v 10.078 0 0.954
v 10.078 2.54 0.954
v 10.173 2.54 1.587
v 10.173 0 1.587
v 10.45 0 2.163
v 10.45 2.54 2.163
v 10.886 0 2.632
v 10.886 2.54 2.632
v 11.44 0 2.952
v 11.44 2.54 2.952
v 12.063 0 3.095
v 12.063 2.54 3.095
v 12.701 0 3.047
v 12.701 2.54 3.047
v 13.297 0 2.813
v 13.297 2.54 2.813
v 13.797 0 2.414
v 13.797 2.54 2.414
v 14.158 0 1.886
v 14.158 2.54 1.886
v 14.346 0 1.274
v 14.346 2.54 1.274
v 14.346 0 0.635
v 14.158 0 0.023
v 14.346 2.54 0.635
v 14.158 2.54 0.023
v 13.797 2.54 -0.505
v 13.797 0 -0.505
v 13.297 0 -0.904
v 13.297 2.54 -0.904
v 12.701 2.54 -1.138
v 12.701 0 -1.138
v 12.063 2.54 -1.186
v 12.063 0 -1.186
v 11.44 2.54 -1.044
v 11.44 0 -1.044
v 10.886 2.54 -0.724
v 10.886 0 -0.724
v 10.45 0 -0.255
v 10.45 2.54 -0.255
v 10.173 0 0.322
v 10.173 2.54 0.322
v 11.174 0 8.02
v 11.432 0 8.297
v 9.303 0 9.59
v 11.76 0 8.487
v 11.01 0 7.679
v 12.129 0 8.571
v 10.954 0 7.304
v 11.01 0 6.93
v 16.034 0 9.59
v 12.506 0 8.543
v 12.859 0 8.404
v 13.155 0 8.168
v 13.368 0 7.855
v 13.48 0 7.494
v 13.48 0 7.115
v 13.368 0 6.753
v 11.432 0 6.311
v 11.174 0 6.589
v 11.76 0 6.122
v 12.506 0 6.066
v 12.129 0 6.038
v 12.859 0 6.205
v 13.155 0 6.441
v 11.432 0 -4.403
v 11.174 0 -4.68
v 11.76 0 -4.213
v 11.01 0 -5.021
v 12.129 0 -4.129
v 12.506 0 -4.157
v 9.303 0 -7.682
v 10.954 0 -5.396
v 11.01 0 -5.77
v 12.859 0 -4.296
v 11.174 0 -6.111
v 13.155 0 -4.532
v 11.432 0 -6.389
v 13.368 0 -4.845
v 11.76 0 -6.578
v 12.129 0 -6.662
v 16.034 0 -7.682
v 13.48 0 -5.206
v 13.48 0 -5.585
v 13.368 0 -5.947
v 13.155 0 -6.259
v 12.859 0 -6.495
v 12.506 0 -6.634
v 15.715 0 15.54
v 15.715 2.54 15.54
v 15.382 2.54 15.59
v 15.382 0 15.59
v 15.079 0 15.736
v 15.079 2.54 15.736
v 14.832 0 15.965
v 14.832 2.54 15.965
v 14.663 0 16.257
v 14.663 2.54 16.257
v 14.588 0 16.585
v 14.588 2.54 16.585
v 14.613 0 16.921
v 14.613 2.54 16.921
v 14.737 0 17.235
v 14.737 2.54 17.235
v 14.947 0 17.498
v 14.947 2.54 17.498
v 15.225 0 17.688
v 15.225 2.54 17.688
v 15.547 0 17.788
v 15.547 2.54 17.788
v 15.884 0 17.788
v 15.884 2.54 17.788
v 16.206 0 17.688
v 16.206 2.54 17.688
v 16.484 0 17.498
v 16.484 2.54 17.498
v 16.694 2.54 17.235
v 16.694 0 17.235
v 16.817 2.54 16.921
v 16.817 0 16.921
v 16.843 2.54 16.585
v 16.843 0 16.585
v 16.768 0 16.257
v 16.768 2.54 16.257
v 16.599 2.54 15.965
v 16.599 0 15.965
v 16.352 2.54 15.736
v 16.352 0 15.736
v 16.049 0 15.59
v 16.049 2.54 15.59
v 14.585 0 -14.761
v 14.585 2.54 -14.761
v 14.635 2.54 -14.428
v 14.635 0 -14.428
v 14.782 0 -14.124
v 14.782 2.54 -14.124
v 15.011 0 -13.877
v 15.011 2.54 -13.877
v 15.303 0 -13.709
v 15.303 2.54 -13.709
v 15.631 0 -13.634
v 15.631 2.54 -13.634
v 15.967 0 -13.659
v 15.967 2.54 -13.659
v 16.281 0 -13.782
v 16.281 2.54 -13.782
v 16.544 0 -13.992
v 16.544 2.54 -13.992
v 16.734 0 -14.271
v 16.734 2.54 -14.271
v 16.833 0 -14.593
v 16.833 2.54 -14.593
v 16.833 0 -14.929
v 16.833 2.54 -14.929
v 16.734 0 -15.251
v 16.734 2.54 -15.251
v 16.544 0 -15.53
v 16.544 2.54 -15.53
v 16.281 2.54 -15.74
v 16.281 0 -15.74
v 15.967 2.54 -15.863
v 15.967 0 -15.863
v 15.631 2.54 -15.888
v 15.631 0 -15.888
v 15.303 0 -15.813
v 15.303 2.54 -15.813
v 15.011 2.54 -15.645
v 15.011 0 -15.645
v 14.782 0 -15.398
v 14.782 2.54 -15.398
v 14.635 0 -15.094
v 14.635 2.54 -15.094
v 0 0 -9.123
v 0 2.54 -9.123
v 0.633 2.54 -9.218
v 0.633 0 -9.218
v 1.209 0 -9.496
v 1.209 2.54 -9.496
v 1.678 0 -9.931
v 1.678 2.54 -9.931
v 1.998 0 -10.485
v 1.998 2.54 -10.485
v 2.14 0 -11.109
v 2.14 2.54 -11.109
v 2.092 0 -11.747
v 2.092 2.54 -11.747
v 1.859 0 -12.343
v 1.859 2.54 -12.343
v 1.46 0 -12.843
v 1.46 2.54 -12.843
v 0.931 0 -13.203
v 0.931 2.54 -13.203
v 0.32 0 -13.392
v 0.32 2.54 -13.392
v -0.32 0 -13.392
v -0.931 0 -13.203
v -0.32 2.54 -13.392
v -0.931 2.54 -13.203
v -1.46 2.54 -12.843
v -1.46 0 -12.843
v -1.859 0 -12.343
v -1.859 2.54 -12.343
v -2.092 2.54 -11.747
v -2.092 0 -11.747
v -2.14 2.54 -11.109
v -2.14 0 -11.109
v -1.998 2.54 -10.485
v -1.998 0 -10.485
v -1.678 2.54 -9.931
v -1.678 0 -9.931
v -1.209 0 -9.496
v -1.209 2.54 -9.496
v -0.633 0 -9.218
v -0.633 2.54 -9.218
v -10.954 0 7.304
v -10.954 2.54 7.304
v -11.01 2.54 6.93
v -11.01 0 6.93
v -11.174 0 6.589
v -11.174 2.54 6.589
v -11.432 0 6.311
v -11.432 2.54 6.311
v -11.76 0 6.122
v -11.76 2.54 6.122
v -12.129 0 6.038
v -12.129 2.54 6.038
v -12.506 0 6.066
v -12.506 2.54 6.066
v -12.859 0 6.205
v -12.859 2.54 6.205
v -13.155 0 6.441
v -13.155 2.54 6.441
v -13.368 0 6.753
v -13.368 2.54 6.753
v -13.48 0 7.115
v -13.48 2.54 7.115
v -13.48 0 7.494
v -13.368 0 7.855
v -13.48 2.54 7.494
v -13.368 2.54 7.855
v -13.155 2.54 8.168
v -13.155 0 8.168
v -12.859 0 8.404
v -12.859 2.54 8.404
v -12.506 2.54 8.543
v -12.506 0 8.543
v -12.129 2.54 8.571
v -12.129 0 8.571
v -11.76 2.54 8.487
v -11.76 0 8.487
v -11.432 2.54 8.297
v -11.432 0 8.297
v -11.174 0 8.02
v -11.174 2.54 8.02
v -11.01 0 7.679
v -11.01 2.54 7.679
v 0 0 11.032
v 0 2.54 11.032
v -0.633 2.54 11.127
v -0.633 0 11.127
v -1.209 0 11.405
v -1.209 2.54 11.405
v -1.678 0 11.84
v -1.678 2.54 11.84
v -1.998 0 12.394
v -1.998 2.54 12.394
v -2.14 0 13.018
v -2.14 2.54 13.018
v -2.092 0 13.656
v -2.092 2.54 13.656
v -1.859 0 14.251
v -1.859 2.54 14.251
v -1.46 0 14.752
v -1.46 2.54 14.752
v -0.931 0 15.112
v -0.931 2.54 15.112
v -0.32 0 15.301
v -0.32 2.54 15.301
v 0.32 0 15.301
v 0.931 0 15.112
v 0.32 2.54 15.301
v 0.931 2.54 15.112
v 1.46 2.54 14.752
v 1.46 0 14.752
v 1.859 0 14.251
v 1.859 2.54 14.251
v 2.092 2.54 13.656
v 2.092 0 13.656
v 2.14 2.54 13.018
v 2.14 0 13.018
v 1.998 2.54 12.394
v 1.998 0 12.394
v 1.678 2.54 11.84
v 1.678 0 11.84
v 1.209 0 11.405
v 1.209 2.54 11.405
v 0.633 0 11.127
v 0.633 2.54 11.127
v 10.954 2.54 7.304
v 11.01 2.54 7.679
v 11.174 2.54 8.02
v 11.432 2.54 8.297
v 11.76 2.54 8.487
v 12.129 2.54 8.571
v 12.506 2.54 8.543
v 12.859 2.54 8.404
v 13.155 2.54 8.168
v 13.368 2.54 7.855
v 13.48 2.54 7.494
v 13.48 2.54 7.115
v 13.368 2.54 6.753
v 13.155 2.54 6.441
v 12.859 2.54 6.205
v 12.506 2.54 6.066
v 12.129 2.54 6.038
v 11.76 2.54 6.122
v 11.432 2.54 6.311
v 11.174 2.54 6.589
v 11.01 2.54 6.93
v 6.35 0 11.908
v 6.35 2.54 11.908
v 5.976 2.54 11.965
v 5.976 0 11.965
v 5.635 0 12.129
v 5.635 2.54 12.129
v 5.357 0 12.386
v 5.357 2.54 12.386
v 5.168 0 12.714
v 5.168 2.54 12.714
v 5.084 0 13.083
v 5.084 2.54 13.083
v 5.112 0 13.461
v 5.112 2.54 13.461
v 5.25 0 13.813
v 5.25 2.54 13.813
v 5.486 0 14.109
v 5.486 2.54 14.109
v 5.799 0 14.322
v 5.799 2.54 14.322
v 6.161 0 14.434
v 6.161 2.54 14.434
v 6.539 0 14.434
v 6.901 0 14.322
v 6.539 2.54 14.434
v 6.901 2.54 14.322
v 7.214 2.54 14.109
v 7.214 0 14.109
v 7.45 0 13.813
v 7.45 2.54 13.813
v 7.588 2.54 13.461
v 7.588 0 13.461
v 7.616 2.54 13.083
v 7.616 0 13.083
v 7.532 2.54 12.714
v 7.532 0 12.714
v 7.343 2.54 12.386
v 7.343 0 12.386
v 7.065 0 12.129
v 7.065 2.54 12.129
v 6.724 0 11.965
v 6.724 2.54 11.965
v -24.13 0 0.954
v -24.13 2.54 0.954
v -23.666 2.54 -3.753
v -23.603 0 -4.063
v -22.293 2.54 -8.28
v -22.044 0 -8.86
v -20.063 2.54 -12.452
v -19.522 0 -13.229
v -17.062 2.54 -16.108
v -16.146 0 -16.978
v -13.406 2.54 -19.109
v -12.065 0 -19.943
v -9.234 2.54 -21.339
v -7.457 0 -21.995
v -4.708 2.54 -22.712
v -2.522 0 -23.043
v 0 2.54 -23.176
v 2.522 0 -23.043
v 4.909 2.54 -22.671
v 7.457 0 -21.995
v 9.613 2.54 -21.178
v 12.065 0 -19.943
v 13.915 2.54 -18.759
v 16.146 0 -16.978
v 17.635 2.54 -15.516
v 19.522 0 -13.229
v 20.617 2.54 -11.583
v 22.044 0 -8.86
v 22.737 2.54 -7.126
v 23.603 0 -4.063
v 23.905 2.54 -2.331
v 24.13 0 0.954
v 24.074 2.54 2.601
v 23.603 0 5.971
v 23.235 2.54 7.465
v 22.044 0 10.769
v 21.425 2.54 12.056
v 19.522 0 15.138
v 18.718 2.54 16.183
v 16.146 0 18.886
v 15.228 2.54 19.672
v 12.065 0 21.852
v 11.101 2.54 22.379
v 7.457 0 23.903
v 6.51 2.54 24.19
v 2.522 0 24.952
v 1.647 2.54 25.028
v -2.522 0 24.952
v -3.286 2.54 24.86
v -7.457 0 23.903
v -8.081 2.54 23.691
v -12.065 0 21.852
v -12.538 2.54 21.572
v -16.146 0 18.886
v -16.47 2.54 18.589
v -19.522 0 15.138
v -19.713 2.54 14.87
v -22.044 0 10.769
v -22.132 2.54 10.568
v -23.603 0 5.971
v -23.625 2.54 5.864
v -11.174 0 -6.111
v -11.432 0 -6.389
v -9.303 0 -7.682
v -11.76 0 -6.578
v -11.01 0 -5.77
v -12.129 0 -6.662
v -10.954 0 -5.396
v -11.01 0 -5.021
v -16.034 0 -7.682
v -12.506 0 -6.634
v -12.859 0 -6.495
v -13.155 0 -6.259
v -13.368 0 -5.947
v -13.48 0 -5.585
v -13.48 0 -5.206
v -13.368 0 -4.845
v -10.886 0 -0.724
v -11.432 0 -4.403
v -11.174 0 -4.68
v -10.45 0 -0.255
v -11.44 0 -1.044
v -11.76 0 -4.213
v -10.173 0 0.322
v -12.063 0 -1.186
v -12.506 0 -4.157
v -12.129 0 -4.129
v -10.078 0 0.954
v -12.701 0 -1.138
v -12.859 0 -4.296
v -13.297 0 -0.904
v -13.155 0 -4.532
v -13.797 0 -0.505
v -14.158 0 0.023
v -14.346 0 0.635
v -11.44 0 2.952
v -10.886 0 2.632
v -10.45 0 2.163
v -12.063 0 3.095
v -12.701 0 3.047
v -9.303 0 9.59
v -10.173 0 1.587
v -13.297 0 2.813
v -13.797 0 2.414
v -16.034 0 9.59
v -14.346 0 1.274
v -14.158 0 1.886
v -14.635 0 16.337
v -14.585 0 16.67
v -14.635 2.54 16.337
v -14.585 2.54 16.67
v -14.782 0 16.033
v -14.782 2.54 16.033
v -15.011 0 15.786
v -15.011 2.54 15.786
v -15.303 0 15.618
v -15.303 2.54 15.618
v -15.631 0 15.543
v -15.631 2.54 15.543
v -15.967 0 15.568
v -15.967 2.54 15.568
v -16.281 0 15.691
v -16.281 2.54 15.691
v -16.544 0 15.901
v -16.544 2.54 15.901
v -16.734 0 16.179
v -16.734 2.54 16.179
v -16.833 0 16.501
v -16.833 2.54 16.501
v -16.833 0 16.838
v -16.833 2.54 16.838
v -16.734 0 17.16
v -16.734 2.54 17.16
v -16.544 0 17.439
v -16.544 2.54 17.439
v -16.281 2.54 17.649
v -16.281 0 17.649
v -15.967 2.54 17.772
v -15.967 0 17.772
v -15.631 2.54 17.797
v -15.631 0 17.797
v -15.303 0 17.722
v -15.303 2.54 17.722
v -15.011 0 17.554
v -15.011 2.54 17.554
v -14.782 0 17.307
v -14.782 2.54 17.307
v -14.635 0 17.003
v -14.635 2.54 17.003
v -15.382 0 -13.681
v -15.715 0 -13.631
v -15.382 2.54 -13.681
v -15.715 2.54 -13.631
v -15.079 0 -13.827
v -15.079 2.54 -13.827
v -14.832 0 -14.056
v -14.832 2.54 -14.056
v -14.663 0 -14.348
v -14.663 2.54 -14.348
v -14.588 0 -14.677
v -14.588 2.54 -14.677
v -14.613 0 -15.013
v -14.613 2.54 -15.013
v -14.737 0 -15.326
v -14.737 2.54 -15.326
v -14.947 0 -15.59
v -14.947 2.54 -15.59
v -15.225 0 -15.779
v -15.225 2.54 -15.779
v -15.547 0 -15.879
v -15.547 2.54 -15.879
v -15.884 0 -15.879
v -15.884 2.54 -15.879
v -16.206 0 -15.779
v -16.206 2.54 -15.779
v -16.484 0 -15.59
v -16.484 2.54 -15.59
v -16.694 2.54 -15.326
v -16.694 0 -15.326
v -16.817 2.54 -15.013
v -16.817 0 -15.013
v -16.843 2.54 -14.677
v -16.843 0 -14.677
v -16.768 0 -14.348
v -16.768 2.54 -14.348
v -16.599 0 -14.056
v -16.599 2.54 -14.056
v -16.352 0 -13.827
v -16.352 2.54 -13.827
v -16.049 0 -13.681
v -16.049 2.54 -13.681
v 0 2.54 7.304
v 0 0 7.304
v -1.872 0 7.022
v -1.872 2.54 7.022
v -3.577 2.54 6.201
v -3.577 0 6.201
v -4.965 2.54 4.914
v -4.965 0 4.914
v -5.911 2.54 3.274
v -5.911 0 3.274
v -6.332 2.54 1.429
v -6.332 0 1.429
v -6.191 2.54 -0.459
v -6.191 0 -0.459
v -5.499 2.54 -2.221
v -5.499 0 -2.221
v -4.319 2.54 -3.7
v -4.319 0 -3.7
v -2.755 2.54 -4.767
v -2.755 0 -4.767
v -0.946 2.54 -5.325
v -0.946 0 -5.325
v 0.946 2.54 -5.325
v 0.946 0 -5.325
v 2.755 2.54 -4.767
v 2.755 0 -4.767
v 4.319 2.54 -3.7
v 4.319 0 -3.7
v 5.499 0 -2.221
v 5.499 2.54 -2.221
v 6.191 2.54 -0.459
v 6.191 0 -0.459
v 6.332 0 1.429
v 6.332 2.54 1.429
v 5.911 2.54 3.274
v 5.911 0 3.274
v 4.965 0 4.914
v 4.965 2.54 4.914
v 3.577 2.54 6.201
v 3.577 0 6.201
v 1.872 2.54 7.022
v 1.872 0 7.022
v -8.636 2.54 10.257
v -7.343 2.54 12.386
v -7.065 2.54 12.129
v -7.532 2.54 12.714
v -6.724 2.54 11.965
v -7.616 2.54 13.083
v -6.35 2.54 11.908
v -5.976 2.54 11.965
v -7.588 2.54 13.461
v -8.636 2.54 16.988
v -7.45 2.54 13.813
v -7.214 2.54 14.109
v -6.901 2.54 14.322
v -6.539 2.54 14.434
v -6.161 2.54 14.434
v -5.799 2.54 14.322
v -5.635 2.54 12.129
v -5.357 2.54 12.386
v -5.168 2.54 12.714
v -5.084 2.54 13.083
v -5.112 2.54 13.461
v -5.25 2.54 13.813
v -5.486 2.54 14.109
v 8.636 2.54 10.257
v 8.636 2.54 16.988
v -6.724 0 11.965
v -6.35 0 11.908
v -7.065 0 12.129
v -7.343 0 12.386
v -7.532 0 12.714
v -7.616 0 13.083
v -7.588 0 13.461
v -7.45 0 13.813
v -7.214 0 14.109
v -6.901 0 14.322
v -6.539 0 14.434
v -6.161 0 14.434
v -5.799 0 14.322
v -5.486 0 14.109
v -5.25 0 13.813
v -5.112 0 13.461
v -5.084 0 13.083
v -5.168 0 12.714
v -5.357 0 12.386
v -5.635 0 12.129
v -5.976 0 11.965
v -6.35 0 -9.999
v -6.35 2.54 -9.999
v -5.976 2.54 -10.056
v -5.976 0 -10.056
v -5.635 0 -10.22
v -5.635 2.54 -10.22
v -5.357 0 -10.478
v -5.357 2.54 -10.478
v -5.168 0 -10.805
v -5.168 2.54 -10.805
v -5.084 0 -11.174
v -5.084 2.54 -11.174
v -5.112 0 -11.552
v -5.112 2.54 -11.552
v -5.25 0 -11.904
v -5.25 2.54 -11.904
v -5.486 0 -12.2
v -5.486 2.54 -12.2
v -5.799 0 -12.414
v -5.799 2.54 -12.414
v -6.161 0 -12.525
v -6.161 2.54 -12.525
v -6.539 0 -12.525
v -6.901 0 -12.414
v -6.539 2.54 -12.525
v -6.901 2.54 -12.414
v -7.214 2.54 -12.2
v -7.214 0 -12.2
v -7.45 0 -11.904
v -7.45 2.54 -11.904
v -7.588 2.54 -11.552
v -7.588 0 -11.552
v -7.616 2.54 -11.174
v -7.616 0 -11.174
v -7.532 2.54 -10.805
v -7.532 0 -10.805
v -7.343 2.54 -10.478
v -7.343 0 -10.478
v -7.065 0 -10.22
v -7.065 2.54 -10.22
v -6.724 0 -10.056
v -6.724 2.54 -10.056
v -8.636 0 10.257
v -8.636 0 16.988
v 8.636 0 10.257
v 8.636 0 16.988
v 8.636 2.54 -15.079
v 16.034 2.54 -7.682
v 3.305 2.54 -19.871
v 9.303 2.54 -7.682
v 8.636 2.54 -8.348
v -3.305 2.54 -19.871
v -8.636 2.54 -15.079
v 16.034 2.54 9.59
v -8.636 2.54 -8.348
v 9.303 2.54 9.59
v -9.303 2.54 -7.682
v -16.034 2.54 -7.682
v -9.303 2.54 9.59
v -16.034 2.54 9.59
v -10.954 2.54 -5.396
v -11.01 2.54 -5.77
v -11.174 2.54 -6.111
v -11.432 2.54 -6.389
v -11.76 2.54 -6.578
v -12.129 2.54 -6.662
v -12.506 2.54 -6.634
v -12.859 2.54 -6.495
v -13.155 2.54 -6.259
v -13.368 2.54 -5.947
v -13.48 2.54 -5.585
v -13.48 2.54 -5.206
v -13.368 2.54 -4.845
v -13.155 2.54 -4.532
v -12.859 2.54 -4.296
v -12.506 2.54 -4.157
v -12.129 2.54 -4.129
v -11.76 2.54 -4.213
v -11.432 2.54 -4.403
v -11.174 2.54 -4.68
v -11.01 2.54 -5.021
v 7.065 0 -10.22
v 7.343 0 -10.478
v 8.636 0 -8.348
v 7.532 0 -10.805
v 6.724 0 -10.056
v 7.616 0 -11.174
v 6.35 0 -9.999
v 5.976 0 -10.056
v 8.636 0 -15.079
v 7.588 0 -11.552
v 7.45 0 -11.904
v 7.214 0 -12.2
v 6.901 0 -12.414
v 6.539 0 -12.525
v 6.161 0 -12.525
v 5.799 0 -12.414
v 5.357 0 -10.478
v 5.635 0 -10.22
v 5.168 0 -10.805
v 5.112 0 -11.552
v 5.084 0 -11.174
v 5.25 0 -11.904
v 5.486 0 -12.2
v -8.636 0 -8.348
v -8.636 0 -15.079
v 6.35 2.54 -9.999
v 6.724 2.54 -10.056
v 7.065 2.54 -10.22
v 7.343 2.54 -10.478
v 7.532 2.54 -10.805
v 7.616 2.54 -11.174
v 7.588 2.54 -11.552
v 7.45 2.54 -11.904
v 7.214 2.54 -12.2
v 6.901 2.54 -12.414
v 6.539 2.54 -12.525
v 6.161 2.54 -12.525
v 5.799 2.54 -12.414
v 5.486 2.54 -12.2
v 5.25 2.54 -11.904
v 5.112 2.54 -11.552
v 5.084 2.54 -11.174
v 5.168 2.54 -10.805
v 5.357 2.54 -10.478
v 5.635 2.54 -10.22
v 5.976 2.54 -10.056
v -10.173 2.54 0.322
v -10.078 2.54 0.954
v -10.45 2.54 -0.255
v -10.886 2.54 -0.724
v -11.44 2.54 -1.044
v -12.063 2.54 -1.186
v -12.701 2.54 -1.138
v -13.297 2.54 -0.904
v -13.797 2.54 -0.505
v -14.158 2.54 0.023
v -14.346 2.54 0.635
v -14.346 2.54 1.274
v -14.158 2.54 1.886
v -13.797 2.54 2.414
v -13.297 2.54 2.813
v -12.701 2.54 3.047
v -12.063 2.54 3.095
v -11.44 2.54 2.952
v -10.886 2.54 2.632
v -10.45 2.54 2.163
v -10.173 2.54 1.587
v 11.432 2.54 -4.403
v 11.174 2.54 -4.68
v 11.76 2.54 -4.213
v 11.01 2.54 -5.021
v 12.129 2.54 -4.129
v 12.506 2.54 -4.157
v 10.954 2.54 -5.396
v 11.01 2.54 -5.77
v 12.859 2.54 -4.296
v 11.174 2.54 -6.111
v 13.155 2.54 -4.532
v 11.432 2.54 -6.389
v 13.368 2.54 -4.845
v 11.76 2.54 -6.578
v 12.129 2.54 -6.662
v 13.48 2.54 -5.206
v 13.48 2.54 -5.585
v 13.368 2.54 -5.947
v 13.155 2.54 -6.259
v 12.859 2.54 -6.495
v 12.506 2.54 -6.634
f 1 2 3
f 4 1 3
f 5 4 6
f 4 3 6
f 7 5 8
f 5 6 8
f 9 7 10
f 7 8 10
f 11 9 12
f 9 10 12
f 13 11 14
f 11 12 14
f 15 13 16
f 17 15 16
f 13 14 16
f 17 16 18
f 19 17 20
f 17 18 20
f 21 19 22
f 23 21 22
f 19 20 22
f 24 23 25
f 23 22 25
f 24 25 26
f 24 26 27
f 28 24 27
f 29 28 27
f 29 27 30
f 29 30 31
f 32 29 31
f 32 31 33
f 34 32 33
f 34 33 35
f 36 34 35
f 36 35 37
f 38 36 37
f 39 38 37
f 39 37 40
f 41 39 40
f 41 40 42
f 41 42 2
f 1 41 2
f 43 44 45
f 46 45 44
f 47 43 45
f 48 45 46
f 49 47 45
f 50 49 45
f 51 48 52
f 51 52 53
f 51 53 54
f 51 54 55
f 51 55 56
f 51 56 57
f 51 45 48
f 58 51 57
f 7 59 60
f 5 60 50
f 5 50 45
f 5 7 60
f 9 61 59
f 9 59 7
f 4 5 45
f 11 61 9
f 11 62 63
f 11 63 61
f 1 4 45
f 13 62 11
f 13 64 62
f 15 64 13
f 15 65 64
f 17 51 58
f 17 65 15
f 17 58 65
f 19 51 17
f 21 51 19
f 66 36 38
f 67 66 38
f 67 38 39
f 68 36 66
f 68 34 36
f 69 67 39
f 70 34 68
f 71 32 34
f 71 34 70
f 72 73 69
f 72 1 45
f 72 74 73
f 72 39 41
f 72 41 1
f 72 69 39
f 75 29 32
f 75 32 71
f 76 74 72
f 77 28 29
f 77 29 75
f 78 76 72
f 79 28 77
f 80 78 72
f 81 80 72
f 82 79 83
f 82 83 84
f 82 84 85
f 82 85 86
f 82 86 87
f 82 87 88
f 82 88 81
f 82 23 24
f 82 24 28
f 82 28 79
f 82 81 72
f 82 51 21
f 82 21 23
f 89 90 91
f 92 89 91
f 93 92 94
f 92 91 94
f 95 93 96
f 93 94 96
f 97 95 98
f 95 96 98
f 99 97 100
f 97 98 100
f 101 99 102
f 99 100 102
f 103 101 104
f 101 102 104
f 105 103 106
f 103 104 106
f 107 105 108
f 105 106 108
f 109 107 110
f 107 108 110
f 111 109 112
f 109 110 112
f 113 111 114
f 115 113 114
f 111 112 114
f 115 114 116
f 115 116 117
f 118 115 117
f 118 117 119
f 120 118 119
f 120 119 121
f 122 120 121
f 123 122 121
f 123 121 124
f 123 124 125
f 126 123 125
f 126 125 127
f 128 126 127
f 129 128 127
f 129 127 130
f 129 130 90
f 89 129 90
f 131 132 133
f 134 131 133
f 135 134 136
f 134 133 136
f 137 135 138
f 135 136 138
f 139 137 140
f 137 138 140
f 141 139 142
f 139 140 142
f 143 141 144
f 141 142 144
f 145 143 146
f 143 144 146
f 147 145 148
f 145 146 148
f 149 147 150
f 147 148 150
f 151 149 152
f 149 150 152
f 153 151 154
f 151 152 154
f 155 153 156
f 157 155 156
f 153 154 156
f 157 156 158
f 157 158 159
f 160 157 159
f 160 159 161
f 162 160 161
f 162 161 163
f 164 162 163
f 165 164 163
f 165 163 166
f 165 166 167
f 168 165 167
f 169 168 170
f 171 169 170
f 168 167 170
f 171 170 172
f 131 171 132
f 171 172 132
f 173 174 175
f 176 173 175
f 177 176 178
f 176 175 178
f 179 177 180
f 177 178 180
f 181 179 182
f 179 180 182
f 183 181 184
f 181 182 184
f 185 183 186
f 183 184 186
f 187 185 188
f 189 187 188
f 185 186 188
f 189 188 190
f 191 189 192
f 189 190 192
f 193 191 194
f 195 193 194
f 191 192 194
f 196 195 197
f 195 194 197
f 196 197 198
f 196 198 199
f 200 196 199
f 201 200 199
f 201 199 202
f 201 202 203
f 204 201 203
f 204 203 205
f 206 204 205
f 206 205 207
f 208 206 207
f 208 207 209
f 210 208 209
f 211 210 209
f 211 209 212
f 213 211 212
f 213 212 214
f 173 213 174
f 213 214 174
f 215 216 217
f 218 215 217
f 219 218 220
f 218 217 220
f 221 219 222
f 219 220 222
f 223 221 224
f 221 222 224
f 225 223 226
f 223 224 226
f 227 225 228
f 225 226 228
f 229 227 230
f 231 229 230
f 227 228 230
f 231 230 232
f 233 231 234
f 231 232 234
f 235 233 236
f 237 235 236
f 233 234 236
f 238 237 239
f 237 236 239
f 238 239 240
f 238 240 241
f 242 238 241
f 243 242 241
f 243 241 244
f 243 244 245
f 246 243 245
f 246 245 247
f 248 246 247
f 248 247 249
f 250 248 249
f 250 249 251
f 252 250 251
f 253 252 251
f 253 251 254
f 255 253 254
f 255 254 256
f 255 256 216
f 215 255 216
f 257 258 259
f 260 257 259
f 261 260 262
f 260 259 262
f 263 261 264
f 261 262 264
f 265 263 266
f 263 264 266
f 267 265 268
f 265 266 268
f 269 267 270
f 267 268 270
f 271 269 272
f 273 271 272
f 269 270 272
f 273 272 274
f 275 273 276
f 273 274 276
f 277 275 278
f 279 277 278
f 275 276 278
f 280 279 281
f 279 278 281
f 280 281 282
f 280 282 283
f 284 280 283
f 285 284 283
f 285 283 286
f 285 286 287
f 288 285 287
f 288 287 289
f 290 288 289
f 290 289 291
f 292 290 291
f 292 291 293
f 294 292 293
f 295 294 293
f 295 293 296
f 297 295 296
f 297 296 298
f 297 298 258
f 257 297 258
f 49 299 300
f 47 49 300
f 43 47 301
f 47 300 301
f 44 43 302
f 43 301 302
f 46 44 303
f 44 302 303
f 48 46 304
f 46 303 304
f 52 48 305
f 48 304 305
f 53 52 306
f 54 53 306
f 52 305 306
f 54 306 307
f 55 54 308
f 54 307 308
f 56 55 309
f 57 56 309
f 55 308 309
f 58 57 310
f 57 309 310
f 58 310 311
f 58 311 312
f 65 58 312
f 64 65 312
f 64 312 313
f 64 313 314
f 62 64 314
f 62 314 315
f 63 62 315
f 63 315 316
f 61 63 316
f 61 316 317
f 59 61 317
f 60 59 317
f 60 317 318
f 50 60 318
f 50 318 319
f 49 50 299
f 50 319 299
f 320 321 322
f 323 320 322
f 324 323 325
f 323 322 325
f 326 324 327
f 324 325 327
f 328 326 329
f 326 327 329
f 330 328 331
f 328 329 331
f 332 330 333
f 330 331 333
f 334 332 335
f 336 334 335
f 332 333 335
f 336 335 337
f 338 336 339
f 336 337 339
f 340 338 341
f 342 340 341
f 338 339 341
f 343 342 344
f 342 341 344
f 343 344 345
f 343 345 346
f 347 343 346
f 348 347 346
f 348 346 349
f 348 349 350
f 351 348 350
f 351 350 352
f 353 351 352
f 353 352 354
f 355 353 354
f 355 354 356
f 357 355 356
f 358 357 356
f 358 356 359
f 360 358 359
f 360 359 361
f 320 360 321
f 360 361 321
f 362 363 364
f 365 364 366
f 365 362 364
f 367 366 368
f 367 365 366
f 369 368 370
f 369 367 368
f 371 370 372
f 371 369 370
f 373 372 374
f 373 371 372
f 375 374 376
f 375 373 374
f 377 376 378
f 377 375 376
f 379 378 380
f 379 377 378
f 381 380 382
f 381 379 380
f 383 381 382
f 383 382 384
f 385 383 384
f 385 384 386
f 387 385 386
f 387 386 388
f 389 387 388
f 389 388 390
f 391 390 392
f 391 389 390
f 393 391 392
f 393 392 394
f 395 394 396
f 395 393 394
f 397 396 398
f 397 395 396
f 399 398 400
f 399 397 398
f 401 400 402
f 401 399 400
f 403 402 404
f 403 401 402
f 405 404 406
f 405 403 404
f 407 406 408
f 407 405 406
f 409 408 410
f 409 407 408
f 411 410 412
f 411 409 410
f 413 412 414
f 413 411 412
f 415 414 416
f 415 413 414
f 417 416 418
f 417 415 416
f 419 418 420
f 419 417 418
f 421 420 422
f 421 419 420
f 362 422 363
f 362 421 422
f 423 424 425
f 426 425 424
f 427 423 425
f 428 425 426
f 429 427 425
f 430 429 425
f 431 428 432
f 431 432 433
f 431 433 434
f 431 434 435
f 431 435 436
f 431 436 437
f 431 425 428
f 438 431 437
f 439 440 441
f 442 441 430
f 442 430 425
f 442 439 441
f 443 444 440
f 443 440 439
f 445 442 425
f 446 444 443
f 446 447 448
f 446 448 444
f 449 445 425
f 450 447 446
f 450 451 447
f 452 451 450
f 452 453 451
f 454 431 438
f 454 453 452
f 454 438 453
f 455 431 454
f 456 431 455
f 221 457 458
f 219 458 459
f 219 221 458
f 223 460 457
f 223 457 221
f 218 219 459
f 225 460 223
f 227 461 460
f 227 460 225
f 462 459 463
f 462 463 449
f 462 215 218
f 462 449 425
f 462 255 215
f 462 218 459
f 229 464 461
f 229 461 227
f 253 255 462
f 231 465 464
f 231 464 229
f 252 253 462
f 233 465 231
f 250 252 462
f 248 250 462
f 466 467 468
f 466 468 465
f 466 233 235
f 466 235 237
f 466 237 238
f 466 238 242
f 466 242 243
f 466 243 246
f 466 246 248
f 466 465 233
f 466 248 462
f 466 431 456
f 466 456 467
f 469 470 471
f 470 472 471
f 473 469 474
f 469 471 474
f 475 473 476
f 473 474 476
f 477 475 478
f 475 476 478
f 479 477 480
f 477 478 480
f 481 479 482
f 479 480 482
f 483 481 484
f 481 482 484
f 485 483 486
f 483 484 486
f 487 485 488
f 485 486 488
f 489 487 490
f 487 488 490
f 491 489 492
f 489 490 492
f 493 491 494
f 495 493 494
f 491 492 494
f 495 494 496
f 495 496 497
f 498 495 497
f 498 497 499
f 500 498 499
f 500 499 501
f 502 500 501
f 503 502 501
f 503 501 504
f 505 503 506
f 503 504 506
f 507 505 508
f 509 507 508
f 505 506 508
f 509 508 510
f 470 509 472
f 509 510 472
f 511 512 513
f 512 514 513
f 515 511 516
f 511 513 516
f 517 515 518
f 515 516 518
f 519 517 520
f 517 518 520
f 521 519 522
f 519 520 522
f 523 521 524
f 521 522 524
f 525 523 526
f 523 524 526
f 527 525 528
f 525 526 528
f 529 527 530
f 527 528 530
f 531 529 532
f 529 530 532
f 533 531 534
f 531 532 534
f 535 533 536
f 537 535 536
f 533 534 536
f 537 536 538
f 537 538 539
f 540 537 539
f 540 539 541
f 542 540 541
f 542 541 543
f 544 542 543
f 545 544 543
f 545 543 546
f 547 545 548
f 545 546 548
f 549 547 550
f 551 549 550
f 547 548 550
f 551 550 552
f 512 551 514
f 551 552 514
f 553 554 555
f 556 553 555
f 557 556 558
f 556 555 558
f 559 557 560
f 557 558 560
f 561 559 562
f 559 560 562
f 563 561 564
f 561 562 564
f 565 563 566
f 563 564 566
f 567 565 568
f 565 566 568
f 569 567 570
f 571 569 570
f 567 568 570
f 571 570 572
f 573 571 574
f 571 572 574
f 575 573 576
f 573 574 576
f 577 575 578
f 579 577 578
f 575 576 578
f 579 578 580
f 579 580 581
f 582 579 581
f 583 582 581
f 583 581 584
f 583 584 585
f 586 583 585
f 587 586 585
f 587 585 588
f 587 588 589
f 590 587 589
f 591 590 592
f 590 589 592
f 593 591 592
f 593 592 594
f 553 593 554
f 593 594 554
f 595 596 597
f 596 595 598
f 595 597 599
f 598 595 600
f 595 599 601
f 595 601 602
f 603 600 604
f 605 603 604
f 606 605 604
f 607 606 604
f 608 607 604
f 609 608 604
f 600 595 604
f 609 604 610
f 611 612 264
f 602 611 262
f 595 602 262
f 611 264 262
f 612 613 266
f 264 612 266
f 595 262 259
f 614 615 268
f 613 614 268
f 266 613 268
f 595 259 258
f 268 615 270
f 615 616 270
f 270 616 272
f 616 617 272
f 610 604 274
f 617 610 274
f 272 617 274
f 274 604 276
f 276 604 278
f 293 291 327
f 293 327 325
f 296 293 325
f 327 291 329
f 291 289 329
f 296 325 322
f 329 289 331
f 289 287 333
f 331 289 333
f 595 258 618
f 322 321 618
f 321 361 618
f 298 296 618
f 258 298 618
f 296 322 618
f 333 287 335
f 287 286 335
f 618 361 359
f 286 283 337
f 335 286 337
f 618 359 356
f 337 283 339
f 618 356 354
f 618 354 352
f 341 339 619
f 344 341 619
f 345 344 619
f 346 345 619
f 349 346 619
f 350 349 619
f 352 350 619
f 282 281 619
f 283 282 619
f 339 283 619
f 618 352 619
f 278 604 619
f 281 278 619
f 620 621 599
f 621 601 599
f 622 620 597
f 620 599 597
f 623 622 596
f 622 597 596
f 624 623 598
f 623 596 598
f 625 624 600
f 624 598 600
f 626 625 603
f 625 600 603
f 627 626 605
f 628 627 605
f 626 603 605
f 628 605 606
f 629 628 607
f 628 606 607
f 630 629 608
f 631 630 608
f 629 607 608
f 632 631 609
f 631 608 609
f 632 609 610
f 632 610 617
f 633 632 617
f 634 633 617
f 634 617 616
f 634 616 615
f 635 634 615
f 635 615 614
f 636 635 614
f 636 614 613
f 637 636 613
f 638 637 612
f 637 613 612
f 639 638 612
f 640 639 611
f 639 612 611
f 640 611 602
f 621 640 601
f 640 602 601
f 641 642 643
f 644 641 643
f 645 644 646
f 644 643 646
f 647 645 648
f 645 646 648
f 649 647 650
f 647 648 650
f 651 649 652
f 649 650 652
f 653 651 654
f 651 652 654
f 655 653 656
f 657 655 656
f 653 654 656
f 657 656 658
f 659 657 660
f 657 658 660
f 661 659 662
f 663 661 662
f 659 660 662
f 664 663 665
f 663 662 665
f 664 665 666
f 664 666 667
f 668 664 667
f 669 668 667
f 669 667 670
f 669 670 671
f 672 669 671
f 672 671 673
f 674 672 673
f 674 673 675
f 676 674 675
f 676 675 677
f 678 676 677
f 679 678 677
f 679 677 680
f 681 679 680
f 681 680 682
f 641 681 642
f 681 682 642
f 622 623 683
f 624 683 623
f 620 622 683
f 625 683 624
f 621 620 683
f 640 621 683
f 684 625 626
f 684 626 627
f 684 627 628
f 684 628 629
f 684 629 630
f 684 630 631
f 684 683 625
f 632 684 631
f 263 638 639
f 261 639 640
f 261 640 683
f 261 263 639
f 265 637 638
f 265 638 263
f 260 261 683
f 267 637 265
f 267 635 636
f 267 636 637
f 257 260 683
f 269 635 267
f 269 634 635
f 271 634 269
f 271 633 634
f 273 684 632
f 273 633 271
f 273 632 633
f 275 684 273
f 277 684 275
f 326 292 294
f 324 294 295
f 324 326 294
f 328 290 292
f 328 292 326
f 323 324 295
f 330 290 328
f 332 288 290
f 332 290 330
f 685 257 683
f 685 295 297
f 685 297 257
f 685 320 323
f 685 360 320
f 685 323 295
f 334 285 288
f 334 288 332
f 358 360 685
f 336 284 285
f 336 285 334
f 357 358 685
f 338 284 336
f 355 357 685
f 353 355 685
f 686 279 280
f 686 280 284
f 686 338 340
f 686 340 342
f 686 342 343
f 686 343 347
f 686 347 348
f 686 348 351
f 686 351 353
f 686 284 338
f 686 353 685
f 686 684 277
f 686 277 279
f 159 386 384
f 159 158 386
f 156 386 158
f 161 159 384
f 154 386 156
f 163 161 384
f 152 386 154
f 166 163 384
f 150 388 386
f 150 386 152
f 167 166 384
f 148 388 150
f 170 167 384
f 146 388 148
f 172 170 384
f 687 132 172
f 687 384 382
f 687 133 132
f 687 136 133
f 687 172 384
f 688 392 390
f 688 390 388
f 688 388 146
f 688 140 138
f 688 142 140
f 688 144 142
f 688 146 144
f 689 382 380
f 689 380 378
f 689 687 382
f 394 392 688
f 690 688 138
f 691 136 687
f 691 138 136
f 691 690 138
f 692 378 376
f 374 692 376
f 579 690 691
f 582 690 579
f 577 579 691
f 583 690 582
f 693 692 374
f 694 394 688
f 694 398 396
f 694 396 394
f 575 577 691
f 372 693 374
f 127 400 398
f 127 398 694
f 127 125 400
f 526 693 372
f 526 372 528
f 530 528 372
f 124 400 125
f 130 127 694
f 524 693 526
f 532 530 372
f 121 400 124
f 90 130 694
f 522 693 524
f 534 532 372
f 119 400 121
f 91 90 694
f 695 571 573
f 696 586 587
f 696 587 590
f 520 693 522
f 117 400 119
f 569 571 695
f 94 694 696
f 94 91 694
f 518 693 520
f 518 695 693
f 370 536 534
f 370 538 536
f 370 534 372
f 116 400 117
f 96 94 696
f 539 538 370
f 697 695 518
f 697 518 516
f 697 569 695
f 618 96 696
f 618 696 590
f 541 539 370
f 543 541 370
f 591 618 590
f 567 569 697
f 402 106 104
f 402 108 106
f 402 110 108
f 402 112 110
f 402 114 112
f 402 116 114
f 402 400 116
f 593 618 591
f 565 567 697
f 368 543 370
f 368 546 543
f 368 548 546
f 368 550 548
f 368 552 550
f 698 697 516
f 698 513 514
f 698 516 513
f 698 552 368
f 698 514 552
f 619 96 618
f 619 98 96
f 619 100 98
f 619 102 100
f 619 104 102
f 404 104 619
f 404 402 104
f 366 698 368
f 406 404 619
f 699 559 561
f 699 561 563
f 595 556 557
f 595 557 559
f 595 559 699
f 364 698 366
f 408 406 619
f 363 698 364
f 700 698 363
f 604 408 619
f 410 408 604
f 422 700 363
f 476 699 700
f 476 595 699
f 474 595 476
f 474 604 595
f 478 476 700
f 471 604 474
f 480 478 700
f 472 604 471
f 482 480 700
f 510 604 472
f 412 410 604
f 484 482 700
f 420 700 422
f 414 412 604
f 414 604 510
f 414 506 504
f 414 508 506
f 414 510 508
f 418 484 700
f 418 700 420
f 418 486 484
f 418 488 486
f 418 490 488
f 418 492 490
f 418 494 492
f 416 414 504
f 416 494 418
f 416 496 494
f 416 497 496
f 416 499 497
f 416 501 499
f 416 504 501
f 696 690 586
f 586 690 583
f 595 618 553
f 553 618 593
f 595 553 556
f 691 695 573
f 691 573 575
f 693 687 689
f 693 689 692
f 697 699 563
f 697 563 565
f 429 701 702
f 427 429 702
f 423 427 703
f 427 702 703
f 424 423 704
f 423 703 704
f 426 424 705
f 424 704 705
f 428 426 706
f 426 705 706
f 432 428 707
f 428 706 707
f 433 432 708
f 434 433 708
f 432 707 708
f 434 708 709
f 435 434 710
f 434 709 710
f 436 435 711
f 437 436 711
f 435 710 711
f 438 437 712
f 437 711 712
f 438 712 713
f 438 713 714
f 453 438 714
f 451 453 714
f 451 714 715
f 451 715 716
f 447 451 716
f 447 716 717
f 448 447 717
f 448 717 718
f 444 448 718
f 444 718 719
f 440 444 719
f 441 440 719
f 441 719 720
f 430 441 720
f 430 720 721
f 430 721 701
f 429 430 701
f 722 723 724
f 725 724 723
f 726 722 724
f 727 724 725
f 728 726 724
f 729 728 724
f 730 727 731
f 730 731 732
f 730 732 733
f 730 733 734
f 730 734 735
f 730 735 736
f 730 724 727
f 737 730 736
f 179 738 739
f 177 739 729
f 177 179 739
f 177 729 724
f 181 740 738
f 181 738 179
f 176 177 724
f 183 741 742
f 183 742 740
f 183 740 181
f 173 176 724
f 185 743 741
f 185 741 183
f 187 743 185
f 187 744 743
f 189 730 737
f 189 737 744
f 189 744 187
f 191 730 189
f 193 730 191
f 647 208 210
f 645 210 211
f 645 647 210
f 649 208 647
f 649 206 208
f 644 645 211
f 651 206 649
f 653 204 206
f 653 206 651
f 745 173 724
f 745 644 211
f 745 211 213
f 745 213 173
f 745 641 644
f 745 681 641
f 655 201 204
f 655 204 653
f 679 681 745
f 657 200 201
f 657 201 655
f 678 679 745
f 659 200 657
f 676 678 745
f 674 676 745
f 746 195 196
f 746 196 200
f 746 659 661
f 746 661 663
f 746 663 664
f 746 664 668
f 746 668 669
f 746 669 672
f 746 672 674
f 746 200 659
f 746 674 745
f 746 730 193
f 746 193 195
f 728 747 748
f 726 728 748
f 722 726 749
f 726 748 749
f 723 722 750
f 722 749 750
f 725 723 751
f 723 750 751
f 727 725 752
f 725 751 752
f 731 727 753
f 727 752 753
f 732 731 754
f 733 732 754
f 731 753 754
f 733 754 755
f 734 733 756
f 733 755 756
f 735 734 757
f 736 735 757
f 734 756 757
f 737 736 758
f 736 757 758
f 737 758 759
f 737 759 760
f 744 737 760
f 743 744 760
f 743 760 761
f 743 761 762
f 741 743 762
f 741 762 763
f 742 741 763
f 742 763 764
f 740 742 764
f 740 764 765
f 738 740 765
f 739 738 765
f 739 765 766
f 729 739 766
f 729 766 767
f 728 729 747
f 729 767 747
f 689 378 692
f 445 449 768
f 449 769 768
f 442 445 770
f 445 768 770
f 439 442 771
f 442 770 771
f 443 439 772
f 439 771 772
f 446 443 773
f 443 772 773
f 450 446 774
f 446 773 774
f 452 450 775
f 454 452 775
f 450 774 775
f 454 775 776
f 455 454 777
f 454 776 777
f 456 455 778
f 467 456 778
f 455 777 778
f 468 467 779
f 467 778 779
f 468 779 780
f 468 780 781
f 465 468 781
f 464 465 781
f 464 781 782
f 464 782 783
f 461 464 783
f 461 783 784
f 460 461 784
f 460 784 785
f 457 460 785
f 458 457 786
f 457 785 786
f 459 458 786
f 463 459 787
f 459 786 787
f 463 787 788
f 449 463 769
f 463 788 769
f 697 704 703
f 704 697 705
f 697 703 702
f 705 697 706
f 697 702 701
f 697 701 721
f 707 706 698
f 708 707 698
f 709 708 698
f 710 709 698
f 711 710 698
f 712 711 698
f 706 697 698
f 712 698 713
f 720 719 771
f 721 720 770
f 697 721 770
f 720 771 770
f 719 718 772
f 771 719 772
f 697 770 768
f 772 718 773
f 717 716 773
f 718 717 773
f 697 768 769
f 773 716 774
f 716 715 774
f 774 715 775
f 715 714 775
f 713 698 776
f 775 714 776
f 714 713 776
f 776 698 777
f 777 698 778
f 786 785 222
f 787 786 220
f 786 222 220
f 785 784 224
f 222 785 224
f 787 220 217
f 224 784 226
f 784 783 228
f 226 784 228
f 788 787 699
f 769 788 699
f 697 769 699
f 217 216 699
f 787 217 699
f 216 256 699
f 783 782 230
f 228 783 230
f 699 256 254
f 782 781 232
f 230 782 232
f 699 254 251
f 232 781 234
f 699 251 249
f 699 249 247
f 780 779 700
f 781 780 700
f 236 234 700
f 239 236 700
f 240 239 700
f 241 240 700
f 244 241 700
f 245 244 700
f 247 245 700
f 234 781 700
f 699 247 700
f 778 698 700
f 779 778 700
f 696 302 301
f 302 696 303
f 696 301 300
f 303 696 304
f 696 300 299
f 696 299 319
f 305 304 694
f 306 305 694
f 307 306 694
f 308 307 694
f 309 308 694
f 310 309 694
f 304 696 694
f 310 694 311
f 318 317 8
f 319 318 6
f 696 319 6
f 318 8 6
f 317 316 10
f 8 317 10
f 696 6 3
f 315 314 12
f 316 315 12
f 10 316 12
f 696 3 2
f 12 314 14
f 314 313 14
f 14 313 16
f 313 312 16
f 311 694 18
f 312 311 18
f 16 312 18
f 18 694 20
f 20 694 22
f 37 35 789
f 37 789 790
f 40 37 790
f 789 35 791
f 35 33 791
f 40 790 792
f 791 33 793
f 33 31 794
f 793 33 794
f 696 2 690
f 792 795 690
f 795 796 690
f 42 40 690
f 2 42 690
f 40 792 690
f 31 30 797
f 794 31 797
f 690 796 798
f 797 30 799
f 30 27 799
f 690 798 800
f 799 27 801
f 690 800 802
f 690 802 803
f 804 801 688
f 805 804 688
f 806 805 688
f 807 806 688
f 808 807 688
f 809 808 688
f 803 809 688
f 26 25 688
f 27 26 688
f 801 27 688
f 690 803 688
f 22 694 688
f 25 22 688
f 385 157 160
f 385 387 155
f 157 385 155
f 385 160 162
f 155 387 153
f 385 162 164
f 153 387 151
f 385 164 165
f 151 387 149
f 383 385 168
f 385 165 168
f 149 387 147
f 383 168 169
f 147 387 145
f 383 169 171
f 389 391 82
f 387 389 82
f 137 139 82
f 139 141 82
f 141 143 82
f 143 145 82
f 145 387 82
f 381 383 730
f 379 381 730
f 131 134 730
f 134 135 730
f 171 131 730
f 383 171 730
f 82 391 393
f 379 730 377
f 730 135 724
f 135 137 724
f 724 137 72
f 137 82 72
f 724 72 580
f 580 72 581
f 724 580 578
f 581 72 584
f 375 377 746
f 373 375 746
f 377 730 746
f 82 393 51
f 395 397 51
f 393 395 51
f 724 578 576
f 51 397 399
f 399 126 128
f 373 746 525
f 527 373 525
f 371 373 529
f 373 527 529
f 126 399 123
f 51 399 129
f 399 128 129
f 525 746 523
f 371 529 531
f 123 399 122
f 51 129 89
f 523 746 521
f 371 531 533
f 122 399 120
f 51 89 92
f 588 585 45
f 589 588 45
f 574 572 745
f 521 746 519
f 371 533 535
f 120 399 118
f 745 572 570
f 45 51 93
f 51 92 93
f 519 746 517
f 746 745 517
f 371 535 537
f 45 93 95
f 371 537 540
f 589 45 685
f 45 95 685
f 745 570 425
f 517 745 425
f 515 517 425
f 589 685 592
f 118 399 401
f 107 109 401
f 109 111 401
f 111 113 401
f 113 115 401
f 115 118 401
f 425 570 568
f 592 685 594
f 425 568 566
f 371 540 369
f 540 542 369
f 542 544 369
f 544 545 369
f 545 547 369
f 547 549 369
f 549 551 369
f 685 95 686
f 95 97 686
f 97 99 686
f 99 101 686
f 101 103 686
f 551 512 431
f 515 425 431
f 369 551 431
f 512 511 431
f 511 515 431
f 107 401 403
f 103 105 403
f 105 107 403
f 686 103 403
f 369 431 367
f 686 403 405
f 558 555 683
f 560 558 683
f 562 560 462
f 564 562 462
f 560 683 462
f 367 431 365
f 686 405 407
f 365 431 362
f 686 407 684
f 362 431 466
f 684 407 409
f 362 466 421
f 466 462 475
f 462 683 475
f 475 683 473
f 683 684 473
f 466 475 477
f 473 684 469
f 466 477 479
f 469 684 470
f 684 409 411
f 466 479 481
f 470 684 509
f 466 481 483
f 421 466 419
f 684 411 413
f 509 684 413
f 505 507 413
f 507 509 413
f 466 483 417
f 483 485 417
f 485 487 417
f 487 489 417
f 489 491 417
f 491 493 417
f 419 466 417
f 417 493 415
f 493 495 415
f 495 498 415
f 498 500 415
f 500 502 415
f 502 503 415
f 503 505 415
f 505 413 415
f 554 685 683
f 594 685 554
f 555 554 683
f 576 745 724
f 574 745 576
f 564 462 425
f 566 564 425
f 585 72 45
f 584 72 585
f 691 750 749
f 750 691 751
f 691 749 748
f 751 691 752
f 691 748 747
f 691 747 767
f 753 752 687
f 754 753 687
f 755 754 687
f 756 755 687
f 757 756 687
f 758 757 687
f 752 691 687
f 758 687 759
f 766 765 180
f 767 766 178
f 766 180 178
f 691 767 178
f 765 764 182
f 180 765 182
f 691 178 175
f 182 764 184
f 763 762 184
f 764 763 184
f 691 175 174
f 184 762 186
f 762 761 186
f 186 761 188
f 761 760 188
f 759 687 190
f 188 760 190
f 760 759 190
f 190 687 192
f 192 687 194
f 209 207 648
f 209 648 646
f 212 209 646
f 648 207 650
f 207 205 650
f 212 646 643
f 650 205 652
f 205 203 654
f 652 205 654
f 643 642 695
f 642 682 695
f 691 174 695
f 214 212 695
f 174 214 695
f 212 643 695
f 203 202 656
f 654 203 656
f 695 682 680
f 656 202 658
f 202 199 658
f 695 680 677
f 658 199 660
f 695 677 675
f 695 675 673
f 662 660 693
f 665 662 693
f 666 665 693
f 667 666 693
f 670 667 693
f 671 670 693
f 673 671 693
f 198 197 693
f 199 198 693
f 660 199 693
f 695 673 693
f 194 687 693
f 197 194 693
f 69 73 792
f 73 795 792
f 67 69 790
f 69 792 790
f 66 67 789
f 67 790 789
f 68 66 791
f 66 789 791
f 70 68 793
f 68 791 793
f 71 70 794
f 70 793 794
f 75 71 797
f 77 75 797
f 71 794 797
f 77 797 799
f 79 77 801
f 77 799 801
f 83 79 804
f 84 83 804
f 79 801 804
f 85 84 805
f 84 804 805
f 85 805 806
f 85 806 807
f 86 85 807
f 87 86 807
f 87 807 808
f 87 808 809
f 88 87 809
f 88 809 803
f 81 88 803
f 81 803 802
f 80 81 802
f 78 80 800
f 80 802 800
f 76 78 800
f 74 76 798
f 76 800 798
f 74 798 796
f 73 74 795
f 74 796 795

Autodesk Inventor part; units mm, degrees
ref_plane "YZ Plane" through (0, 0, 0) normal (1, 0, 0) x (0, 1, 0)
ref_plane "XZ Plane" through (0, 0, 0) normal (0, 1, 0) x (-1, 0, 0)
ref_plane "XY Plane" through (0, 0, 0) normal (0, 0, 1) x (1, 0, 0)
sketch "Sketch1" plane through (0, 0, 0) normal (0, 1, 0) x (-1, 0, 0)
  circle A0 centre (0, 0.9544) radius 24.13
  point P0 (0, 0)
  dimension "d0" = 48.26
extrude "Extrusion1" add sketch "Sketch1" along normal blind 2.54
sketch "Sketch2" plane through (0, 0, 0.9544) normal (0, -1, 0) x (1, 0, 0)
  circle A0 centre (0, 0) radius 24.13 projected
  line L0 (-8.636, 9.3028) -> (8.636, 9.3028)
  line L1 (8.636, 9.3028) -> (8.636, 16.0337)
  line L2 (8.636, 16.0337) -> (-8.636, 16.0337)
  line L3 (-8.636, 16.0337) -> (-8.636, 9.3028)
  line L4 (0, 0) -> (0, 9.3028) construction
  line L5 (0, 9.3028) -> (0, 16.0337) construction
  dimension "d9" = 17.272
  dimension "d10" = 6.731
  dimension "d11" = 9.3027
extrude "Extrusion2" add sketch "Sketch2" along normal blind 0.0003 and the other way blind 2.5403 contours L3 L2 L1 L0
pattern_circular "Circular Pattern1" count 4 over 360 about axis through (0, 0, 0.9544) along (0, 1, 0) of "Extrusion2"
sketch "Sketch3" plane through (0, 0, 0.9544) normal (0, -1, 0) x (1, 0, 0)
  line L0 (8.636, 9.3027) -> (-8.636, 9.3027) projected
  circle A0 centre (0, 0) radius 24.13 projected
  line L1 (0, 0) -> (15.7154, 15.7154) construction
  line L2 (0, 0) -> (6.7376, 0) construction
  circle A1 centre (15.7154, 15.7154) radius 1.1303
  dimension "d22" = 22.225
  dimension "d23" = 45
  dimension "d24" = 2.2606
hole "Hole1" at (15.7154, 0, 16.6699) direction (0, 1, 0) diameter 2.2606 depth 25.4 tip angle 118
pattern_circular "Circular Pattern2" count 4 over 360 about axis through (0, 0, 0.9544) along (0, 1, 0) of "Hole1"
sketch "Sketch4" plane through (0, -0.0003, 0.9544) normal (0, -1, 0) x (1, 0, 0)
  line L0 (-8.636, 9.3027) -> (8.636, 9.3027) projected
  circle A0 centre (0, 12.2237) radius 1.7579
  point P0 (0, -0.9544)
  dimension "d35" = 2.921
hole "Hole2" at (0, -0.0003, 13.1782) direction (0, 1, 0) diameter 4.2926 depth 25.4 tip angle 118
sketch "Sketch5" plane through (0, -0.0003, 0.9544) normal (0, -1, 0) x (1, 0, 0)
  circle A0 centre (0, 12.2237) radius 2.1463 projected
  line L0 (8.636, 16.0337) -> (-8.636, 16.0337) projected
  circle A1 centre (-6.35, 12.2237) radius 1.1799
  line L1 (0, 12.2237) -> (0, 16.0337) construction
  circle A2 centre (6.35, 12.2237) radius 1.1799
  point P0 (0, -0.9544)
  dimension "d60" = 6.35
hole "Hole3" at (-6.35, -0.0003, 13.1782) at (6.35, -0.0003, 13.1782) direction (0, 1, 0) diameter 2.54 depth 25.4 tip angle 118
pattern_circular "Circular Pattern3" count 4 over 360 about axis through (0, 0, 0.9544) along (0, 1, 0) of "Hole3", "Hole2"
sketch "Sketch6" plane through (0, 2.54, 0.9544) normal (0, 1, 0) x (1, 0, 0)
  line L0 (8.636, -16.0337) -> (-8.636, -16.0337) projected
  circle A0 centre (0, 0) radius 24.13 projected
  line L1 (0, 24.13) -> (0, 20.828) construction
  line L2 (0, 24.13) -> (3.3047, 20.8253)
  line L3 (0, 24.13) -> (4.6736, 24.13) construction
  line L4 (0, 24.13) -> (-3.3047, 20.8253)
  line L5 (-3.3047, 20.8253) -> (3.3047, 20.8253)
  point P0 (0, 0.9544)
  dimension "d55" = 3.302
  dimension "d56" = 4.6736
  dimension "d57" = 45
extrude "Extrusion3" add sketch "Sketch6" along normal blind 0.0003 contours L2 L5 L4
sketch "Sketch7" plane through (0, 2.54, 0) normal (0, 1, 0) x (1, 0, 0)
  circle A0 centre (0, -0.9544) radius 24.13 projected
  circle A1 centre (0, -0.9544) radius 6.35
  point P0 (0, 0)
  dimension "d61" = 12.7
hole "Hole4" at (0, 2.54, 0.9544) direction (0, -1, 0) diameter 12.7 depth 25.4 tip angle 118
sketch "Sketch8" plane through (9.3027, -0.0003, -7.6816) normal (0, -1, 0) x (1, 0, 0)
  circle A0 centre (2.921, 8.636) radius 2.1463 projected
sketch "Sketch9" plane through (-16.0337, -0.0003, 9.5904) normal (0, -1, 0) x (1, 0, 0)
  circle A0 centre (3.81, -8.636) radius 2.1463 projected
sketch "Sketch10" plane through (0, -0.0003, 0.9544) normal (0, -1, 0) x (1, 0, 0)
  circle A0 centre (0, 12.2237) radius 2.1463 projected
sketch "Sketch11" plane through (-8.636, -0.0003, -8.3483) normal (0, -1, 0) x (1, 0, 0)
  circle A0 centre (8.636, -2.921) radius 2.1463 projected
properties part number "matingBoard"
